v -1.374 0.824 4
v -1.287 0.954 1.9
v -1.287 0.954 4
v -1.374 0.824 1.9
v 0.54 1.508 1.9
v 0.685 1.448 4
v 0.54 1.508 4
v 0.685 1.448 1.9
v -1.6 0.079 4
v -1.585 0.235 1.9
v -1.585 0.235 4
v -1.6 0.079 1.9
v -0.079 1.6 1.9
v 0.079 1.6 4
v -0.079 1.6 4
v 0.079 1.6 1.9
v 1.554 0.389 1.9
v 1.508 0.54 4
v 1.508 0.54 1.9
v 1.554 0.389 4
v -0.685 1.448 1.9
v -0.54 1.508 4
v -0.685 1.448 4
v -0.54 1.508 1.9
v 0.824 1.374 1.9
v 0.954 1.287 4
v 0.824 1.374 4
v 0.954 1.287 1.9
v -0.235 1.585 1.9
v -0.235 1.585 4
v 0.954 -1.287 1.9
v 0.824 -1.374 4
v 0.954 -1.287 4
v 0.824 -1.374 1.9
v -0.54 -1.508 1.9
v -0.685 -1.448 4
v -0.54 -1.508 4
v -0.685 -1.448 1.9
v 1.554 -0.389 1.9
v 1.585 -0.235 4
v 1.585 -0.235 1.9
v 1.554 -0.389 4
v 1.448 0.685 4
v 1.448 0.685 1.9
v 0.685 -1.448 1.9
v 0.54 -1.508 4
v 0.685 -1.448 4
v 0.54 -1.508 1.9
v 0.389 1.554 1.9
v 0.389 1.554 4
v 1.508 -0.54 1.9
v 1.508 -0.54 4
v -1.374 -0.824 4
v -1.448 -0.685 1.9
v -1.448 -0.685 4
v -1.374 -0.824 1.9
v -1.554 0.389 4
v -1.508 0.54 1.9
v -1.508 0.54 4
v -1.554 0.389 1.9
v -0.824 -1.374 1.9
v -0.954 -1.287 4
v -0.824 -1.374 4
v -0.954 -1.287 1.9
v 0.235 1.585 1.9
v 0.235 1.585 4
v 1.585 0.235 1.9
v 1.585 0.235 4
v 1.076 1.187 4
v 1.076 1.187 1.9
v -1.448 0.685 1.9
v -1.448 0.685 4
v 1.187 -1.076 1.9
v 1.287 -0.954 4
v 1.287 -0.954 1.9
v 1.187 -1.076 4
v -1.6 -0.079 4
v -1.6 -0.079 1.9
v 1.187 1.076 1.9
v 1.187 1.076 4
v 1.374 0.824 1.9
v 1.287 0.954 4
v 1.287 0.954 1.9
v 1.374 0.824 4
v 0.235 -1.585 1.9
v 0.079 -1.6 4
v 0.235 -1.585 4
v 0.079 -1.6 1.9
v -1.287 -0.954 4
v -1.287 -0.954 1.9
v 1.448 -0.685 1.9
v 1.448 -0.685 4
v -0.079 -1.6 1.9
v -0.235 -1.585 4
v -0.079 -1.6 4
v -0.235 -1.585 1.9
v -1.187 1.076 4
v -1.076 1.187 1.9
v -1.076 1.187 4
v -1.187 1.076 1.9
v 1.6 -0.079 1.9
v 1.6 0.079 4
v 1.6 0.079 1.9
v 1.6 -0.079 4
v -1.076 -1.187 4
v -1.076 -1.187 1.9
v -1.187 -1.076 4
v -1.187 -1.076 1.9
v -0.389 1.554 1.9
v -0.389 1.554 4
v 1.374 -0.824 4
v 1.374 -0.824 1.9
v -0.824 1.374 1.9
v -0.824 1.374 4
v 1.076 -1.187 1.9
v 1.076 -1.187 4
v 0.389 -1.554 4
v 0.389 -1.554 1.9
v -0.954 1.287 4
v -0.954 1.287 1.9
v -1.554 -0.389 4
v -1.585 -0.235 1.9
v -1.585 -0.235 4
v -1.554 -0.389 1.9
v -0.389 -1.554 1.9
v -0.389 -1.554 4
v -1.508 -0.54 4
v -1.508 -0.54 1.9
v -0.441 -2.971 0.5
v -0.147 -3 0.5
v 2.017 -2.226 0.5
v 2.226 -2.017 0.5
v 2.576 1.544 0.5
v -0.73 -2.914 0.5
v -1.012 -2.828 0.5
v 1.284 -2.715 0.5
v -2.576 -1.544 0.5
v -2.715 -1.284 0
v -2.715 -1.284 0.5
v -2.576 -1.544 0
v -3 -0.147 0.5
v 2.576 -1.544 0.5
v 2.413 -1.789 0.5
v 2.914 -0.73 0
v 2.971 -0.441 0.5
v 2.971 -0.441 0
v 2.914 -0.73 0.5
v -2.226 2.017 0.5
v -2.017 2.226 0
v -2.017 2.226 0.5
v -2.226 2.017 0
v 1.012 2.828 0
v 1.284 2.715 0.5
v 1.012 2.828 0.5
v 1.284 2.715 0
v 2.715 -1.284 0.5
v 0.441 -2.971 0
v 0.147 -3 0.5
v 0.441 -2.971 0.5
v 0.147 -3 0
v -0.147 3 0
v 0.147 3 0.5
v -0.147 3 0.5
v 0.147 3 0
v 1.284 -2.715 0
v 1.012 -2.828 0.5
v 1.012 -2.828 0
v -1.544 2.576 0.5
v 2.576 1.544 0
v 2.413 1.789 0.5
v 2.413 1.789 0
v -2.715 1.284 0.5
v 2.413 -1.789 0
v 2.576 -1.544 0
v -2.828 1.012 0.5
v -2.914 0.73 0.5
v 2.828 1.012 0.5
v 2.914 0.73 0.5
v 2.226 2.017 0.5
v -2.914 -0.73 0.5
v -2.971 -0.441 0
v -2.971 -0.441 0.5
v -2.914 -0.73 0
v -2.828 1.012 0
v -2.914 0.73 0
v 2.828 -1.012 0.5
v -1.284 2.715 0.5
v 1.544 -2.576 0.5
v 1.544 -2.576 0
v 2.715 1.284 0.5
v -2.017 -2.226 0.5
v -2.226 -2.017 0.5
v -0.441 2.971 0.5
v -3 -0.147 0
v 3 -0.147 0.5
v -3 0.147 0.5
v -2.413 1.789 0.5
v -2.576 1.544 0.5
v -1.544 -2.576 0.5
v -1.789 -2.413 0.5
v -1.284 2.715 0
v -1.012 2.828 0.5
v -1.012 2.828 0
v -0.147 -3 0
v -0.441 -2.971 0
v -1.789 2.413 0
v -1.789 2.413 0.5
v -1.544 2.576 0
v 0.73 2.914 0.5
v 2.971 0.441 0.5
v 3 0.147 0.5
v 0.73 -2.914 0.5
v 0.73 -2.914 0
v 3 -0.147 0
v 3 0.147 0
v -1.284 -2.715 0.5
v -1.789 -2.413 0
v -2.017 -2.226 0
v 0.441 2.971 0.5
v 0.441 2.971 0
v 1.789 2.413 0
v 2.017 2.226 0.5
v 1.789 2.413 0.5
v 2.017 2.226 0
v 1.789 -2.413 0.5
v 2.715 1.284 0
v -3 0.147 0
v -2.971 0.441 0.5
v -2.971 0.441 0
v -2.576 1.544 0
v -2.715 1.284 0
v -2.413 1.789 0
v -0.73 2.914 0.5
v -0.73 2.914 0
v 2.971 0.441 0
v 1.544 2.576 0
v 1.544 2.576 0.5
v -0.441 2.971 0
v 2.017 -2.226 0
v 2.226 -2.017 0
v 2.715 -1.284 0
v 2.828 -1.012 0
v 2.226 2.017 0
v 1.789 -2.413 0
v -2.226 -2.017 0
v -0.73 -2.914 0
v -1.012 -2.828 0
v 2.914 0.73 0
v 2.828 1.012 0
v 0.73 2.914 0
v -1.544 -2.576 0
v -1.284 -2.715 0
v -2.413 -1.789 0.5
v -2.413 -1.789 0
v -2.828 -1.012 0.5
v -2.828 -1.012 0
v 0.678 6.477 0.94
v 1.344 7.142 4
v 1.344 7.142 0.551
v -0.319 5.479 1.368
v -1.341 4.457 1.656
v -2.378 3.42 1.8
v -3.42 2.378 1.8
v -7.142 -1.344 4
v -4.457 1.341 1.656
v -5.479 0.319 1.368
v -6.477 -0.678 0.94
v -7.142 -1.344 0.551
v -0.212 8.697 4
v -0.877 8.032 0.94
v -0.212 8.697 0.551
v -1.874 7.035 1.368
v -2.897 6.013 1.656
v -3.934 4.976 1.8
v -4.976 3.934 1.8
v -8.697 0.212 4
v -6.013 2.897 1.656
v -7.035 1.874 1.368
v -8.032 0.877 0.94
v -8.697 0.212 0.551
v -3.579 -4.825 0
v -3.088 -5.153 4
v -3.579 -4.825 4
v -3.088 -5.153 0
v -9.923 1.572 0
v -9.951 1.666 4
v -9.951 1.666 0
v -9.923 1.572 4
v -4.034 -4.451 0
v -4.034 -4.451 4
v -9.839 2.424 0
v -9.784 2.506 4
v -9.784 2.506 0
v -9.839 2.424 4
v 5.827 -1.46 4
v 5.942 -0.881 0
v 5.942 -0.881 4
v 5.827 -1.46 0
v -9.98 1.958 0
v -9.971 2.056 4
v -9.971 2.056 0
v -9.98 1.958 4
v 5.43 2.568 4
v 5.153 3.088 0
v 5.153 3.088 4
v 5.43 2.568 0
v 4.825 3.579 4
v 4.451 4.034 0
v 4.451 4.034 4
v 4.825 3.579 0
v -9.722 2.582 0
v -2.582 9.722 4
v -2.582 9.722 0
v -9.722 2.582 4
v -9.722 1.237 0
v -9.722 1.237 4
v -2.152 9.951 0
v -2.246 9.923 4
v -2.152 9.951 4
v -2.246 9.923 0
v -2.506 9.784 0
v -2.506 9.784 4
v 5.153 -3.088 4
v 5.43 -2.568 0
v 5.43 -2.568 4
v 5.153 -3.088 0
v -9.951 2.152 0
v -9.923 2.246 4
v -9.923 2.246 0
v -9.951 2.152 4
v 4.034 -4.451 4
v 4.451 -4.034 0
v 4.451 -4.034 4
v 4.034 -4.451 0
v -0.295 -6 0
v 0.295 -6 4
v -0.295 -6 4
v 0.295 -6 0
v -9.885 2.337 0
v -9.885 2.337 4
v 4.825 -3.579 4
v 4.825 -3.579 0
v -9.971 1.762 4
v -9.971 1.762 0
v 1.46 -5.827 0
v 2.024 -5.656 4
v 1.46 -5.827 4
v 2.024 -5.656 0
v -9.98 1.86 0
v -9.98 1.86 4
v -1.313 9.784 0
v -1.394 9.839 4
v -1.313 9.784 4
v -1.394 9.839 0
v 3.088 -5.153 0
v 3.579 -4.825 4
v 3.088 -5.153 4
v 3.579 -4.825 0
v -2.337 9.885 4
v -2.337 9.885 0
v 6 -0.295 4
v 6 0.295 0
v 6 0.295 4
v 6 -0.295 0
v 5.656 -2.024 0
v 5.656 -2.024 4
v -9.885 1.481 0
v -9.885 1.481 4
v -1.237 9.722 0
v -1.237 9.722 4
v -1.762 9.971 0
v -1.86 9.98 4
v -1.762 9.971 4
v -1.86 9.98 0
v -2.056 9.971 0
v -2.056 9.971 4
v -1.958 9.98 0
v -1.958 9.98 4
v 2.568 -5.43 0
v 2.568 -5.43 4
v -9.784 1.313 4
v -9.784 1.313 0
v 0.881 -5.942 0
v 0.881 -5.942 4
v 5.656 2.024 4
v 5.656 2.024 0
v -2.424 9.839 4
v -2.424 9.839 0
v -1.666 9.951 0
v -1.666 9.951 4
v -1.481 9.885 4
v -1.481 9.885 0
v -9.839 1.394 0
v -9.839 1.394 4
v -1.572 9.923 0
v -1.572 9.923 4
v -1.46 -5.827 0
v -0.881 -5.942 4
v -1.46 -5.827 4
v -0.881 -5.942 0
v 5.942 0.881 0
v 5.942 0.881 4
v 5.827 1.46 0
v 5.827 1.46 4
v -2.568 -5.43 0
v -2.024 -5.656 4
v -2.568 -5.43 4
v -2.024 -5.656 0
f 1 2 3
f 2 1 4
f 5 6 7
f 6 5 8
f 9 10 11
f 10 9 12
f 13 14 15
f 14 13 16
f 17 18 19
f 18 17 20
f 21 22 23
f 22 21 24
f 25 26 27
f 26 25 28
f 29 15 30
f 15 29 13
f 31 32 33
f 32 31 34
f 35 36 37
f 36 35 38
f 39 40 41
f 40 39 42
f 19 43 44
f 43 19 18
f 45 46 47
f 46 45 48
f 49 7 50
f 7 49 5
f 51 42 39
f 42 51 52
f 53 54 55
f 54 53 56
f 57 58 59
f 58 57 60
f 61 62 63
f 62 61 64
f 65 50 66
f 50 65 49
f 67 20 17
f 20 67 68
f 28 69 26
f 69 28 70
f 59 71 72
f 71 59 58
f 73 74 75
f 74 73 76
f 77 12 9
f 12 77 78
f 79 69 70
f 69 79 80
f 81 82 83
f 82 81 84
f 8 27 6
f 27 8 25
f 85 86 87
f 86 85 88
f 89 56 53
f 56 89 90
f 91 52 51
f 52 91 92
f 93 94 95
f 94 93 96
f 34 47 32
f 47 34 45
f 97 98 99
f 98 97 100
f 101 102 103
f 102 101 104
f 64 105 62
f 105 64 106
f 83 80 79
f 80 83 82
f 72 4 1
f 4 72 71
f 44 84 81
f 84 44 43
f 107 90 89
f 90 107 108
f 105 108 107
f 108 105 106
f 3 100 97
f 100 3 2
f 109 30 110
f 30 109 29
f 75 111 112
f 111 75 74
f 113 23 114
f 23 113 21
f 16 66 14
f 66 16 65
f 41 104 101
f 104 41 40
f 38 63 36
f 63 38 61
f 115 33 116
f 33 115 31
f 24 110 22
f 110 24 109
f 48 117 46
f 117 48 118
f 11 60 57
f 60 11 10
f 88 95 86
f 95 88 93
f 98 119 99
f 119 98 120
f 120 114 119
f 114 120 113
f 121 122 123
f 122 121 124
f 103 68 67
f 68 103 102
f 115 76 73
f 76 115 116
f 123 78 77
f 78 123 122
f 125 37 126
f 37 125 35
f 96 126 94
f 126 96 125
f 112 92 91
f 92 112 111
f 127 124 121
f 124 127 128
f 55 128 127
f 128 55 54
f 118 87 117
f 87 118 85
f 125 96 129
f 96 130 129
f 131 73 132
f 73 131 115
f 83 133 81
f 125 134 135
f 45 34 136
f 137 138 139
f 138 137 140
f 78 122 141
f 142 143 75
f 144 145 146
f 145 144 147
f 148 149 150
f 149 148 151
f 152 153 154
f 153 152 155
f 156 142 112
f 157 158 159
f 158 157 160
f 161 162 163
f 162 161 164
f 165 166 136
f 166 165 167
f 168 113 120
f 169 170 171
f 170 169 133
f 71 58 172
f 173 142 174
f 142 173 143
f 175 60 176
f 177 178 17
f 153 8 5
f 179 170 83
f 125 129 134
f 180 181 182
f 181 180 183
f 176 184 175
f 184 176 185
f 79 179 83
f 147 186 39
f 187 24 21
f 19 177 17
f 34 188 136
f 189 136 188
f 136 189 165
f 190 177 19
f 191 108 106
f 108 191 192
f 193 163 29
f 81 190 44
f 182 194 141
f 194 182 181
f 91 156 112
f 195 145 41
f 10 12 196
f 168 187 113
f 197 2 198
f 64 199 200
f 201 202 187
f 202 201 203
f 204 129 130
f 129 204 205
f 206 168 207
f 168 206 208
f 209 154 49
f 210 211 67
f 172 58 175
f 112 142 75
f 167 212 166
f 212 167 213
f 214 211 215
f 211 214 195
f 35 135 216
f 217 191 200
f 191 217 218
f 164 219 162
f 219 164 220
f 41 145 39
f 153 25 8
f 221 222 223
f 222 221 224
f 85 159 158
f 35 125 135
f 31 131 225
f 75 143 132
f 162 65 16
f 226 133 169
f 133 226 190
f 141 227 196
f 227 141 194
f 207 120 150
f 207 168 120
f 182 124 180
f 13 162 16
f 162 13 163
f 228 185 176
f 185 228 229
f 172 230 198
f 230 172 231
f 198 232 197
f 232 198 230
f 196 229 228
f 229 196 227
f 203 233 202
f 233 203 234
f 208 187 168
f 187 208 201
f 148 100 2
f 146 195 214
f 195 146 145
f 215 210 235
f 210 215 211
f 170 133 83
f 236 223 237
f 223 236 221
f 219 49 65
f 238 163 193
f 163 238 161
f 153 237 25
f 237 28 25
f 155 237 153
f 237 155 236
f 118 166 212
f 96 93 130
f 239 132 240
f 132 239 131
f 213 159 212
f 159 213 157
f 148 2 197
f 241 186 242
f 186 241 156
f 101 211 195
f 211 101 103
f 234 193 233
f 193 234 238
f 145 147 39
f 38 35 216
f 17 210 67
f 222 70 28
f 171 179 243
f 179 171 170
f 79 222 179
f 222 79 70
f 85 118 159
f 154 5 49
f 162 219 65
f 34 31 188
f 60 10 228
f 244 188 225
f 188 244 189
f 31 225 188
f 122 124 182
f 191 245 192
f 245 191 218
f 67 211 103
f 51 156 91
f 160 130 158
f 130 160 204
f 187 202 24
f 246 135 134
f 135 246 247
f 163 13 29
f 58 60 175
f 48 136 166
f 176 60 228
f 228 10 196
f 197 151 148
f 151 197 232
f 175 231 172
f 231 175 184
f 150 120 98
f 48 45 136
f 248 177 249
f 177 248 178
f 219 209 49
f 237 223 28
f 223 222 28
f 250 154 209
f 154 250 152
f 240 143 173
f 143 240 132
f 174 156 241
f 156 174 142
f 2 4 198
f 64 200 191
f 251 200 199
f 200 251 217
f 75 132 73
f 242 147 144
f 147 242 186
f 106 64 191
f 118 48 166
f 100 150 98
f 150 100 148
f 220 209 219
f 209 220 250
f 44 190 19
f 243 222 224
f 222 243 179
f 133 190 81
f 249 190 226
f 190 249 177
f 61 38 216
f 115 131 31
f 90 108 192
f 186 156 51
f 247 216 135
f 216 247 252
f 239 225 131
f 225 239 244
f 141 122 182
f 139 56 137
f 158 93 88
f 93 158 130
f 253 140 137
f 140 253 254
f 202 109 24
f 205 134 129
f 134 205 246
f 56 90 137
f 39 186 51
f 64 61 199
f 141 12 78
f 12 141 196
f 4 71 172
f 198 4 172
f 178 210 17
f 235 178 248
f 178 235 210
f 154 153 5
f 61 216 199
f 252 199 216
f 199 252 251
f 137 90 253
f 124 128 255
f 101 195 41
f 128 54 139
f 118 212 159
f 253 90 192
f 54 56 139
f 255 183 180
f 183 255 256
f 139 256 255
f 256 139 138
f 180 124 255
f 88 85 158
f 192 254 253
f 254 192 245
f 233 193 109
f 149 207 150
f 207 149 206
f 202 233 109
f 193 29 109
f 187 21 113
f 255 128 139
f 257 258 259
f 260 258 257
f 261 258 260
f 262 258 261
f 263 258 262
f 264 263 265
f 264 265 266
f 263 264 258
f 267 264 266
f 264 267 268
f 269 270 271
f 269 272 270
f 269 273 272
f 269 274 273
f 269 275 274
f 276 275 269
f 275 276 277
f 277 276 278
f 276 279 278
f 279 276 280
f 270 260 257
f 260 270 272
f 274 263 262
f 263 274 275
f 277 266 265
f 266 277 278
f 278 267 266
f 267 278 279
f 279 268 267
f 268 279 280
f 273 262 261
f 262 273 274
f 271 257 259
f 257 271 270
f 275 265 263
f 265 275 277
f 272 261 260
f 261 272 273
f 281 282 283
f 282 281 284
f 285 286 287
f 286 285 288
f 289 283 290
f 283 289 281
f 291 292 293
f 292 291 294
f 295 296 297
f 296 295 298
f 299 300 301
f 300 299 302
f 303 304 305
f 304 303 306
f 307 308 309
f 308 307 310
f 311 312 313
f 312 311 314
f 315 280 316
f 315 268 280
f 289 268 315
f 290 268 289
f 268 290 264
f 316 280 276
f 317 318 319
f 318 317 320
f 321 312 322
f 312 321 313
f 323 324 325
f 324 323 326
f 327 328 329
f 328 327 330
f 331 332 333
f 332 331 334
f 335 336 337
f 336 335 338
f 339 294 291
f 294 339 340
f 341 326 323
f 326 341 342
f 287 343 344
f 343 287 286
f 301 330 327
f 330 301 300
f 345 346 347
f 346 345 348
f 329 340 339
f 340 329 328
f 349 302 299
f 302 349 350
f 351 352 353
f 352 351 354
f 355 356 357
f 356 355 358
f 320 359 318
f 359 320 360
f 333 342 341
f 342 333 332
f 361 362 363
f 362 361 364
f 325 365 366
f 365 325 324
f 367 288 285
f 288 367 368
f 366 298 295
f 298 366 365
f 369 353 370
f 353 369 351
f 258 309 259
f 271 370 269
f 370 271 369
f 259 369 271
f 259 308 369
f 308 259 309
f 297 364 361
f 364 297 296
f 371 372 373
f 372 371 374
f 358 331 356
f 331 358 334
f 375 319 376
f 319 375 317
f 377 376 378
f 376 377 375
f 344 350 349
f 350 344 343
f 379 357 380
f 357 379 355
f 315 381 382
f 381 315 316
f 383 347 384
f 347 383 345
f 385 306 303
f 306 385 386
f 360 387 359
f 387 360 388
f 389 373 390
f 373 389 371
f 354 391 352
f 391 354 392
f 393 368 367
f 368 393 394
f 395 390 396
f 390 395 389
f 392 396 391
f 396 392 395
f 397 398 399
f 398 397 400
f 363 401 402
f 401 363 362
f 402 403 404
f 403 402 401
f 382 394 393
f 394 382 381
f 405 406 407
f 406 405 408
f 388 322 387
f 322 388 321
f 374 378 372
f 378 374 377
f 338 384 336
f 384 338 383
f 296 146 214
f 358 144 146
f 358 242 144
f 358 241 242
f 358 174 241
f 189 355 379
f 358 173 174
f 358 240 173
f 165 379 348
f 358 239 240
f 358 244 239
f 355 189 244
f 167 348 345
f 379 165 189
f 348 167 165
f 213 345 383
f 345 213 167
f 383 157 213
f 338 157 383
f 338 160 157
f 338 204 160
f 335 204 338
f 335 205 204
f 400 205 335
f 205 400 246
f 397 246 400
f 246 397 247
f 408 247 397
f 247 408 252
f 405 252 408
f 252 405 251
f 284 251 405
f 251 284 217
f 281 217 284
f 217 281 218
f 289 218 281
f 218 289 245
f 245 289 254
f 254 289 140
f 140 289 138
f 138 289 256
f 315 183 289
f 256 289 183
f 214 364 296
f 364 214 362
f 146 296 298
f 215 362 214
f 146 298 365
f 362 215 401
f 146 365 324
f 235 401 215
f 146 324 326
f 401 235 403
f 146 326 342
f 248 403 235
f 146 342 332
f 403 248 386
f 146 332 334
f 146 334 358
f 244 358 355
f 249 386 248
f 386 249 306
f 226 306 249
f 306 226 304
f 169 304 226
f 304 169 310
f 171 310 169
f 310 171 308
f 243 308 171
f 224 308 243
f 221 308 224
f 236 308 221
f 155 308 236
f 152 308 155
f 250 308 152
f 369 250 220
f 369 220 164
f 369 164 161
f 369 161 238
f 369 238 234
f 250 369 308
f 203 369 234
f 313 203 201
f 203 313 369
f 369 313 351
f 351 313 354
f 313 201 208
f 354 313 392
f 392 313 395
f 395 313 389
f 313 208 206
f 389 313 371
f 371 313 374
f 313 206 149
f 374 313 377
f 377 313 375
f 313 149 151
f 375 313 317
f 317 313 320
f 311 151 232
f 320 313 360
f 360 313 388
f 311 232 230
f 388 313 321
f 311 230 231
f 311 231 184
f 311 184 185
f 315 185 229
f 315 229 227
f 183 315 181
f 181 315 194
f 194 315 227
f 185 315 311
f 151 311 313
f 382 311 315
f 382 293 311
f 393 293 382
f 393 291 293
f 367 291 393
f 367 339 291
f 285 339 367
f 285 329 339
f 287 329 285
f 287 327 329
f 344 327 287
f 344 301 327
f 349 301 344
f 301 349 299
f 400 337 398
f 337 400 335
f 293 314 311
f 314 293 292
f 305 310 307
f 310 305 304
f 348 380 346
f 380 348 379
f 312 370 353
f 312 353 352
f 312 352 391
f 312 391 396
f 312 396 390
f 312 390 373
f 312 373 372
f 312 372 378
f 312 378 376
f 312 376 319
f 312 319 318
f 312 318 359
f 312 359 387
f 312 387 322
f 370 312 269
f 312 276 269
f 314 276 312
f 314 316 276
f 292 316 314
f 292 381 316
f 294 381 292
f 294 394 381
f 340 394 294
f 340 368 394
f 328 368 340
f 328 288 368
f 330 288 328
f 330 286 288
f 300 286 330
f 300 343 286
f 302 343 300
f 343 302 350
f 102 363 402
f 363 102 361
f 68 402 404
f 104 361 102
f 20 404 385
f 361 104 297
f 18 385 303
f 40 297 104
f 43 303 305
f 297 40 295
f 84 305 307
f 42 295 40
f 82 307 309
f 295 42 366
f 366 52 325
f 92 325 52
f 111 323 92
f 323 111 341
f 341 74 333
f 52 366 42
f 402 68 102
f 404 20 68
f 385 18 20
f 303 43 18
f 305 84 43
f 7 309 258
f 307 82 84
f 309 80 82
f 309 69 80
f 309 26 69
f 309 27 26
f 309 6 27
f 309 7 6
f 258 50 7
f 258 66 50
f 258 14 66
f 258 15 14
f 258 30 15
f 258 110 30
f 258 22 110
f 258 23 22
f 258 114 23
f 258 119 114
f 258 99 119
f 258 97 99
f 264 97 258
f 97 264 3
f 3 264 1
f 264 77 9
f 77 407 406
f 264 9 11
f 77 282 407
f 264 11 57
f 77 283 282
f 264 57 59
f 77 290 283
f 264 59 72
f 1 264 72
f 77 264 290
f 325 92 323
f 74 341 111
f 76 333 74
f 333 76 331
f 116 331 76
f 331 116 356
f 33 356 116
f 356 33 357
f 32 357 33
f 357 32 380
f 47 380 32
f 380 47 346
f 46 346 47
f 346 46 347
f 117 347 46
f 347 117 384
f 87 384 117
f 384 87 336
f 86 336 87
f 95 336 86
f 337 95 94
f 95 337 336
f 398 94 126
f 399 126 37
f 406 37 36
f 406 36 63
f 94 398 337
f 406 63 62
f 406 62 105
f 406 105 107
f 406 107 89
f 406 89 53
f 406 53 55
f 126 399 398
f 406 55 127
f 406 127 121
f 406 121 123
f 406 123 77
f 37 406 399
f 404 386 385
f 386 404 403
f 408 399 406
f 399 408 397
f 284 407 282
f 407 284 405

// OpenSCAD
// file: lib/util.scad
resolution = (true) ? 64 : 16; // switch to res of 16 for better preview performance

pi = 3.141592;

left = -1;
right = 1;
top = 1;
bottom = -1;
rear = 1;
front = -1;

function accurate_diam(diam,sides) = 1 / cos(180/sides) / 2 * diam;

module hole(diam,len,sides=8) {
  rotate([0,0,180/sides]) {
    cylinder(r=accurate_diam(diam,sides),h=len,center=true,$fn=sides);
  }
}

module accurate_circle(diam,sides=8) {
  rotate([0,0,180/sides]) {
    circle(r=accurate_diam(diam,sides),$fn=sides);
  }
}

module debug_axes() {
  color("red") translate([50,0,0]) cube([100,.2,.2],center=true);
  color("green") translate([0,50,0]) cube([.2,100,.2],center=true);
  color("blue") translate([0,0,50]) cube([.2,.2,100],center=true);
}

module ring(id,thickness,height,fn=16) {
  od = id + thickness;
  linear_extrude(height=height,center=true) {
    difference() {
      accurate_circle(od,fn);
      accurate_circle(id,fn);
    }
  }
}

module rounded_square(width,depth,diam,fn=resolution) {
  pos_x = width/2-diam/2;
  pos_y = depth/2-diam/2;

  hull() {
    for(x=[left,right]) {
      for(y=[front,rear]) {
        translate([x*pos_x,y*pos_y,0]) {
          accurate_circle(diam,fn);
        }
      }
    }
  }
}

module rounded_cube(width,depth,height,diam,fn=resolution) {
  linear_extrude(height=height,center=true,convexity=3) {
    rounded_square(width,depth,diam,fn);
  }
}

module round_corner_filler(diam,length) {
  linear_extrude(height=length,center=true,convexity=3) {
    round_corner_filler_profile(diam);
  }
}

module round_corner_filler_profile(diam,res=resolution) {
  difference() {
    translate([diam/4,diam/4,0]) {
      square([diam/2,diam/2],center=true);
    }
    translate([diam/2,diam/2,0]) {
      accurate_circle(diam,res);
    }
  }
}

module space_along_length(length,min_hole_spacing=4*inch,from_end=1*inch) {
  avail_length = length - (from_end*2);
  num_spaces   = floor(avail_length / min_hole_spacing);
  extra_space  = (avail_length - (num_spaces*min_hole_spacing)) / num_spaces;
  spacing      = min_hole_spacing + extra_space;

  // echo(length, num_spaces, spacing);

  translate([0,-length/2+from_end,0]) {
    for(y=[0:num_spaces]) {
      translate([0,y*spacing,0]) {
        children();
      }
    }
  }
}

module letter_spike(thin_width,thick_width,thickness) {
  hull() {
    cylinder(r=thin_width,h=thickness*2,center=true,$fn=16);
    cylinder(r=thick_width,h=0.01,center=true,$fn=16);
  }
}

module letter_L(width=10,height=20,thickness=0.5,thick_width=2,thin_width=0.3) {
  lines = [
    [
      [-width/2,height/2,0],
      [-width/2,-height/2,0],
    ],
    [
      [-width/2,-height/2,0],
      [width/2,-height/2,0],
    ],
  ];

  for(pair=lines) {
    hull() {
      for(vect=pair) {
        translate(vect) {
          letter_spike(thin_width,thick_width,thickness);
        }
      }
    }
  }
}

module letter_R(width=10,height=20,thickness=0.5,thick_width=2,thin_width=0.3) {
  lines = [
    [
      [-width/2,height/2,0],
      [-width/2,-height/2,0],
    ],
    [
      [-width/2,height/2,0],
      [width/2,height/3,0],
    ],
    [
      [width/2,height/3,0],
      [-width/4,0,0],
    ],
    [
      [-width/2,0,0],
      [-width/4,0,0],
    ],
    [
      [-width/4,0,0],
      [width/2,-height/2,0],
    ],
  ];

  for(pair=lines) {
    hull() {
      for(vect=pair) {
        translate(vect) {
          letter_spike(thin_width,thick_width,thickness);
        }
      }
    }
  }
}

module zip_tie_cavity(inner_diam_input,zip_tie_thickness,zip_tie_width,fn=resolution) {
  inner_diam = inner_diam_input -0.05;
  overall_width = inner_diam+zip_tie_thickness*2;

  module profile() {
    for(x=[left,right]) {
      translate([x*(inner_diam/2+zip_tie_thickness/2),overall_width,0]) {
        square([zip_tie_thickness,overall_width*2],center=true);
      }
    }

    intersection() {
      translate([0,-overall_width,0]) {
        square([overall_width*2,overall_width*2],center=true);
      }
      difference() {
        accurate_circle(inner_diam+zip_tie_thickness*2,fn);
        accurate_circle(inner_diam,fn);
      }
    }
  }

  linear_extrude(height=zip_tie_width,convexity=3,center=true) {
    profile();
  }
}

module printed_extrusion_carriage_profile(body_width,body_height) {
  spring_thickness = extrude_width*4;
  spring_gap_width = 1;
  preload = -0.2; // negative makes more slack both for print and UHMWPE tape
  wall_thickness = extrude_width*4;

  cavity_width = body_width - wall_thickness*4;
  cavity_height = body_height - wall_thickness*4;

  module spring_profile() {
    contact_width = 8;

    translate([0,-preload+spring_thickness/2]) {
      translate([left*(y_rail_extrusion_width/2-contact_width/2),0,0]) {
        rounded_square(contact_width,spring_thickness,spring_thickness);
      }
      hull() {
        translate([left*(y_rail_extrusion_width/2-contact_width+spring_thickness/2),0,0]) {
          accurate_circle(spring_thickness,resolution);
        }
        translate([right*(y_rail_extrusion_width/2-spring_thickness),spring_gap_width/2,0]) {
          accurate_circle(spring_thickness,resolution);
        }
      }
      translate([right*(y_rail_extrusion_width/2-spring_thickness),2-spring_thickness/2+spring_gap_width/2,0]) {
        rounded_square(spring_thickness,4,spring_thickness);
      }
    }
  }

  for(z=[top,bottom]) {
    mirror([0,1-z,0]) {
      translate([0,y_rail_extrusion_height/2]) {
        spring_profile();
      }

      for(x=[left,right]) {
        mirror([1-x,0,0]) {
          translate([y_rail_extrusion_width/2,y_rail_extrusion_height/4,0]) {
            rotate([0,0,-90]) {
              spring_profile();
            }
          }
        }
      }
    }
  }

  difference() {
    gap_width = cavity_height - y_rail_extrusion_height;
    rounded_square(body_width,body_height,wall_thickness*8);
    rounded_square(cavity_width,cavity_height,gap_width);
  }
}

/*
translate([-10,0,0]) {
  letter_L();
}

translate([10,0,0]) {
  letter_R();
}
*/
// file: config.scad
include <./lib/util.scad>;
include <./lib/vitamins.scad>;

tolerance = 0.2;
extrude_width = 0.4;
wall_thickness = extrude_width*3;

countersink_all_the_things = 1;

room_below_extrusion_for_electronics = 34;

extrusion_mount_screw_diam = m5_diam;
extrusion_mount_screw_head_diam = (countersink_all_the_things) ? m5_fsc_head_diam : m5_nut_diam;

m3_thread_into_hole_diam = 2.9;
m3_loose_diam = m3_diam + tolerance;

m5_thread_into_hole_diam = 4.9;
m5_loose_diam = 5+tolerance;

extrusion_width = 20;

leadscrew_diam = 5;
leadscrew_hole_diam = 6.5;
leadscrew_nut_shaft_diam = 8.5;
leadscrew_nut_shaft_length = 6.5;
leadscrew_nut_hole_dist = 6.611;
leadscrew_nut_flange_diam = 20;
leadscrew_nut_flange_thickness = 3.25;
leadscrew_nut_mounting_hole_dist = 6.35;
leadscrew_nut_mounting_hole_diam = 2.8; // from walter's -- threading m3 into plastic?
leadscrew_motor_length = 33.5;
x_motor_length = 44;
y_motor_length = 44;

rounded_diam = m3_nut_diam + tolerance*2 + wall_thickness*4;

t_slot_nut_screw_hole_depth = 5;
t_slot_nut_length = 11;

y_idler_in_endcap = true;

// FIXME: adjust these to fit an aluminum heatspreader between the aluminum extrusion and the duet wifi board to provide a passive heatsink for the drivers -- An idea I got from Walter.
duet_mount_thickness = 3;
duet_mount_bevel_height = 1;

end_cap_rounded_diam = 3+wall_thickness*4;
end_cap_pos_x = 40;
end_cap_extrusion_width_to_cover = 100;
end_cap_thickness = (y_idler_in_endcap) ? m5_thread_into_hole_diam + 2*(1.2*2)-0.2 : 5; // remove a 0.2mm layer because cura was printing an infill layer rather than solid
end_cap_offset_x = -4;
end_cap_overhang = end_cap_rounded_diam/2;
end_cap_width = end_cap_extrusion_width_to_cover + abs(end_cap_offset_x)*2 + end_cap_overhang*2;
end_cap_height = extrusion_width+room_below_extrusion_for_electronics+wall_thickness;

y_extrusion_width = (true) ? 100 : 80;

y_idler_pos_x = -10+y_extrusion_width-30;
y_idler_dist_y_from_extrusion = (y_idler_in_endcap) ? -end_cap_thickness/2 : gt2_toothed_idler_id;
y_idler_dist_z_from_extrusion = 1;

extra_clearance_for_leveling_screws_and_y_idlers = 3;

heated_bed_hole_spacing = 92;
// using what walter is doing, as I don't understand whosawhatsis' version, but he's using something like -24
// I like the idea of a less-cantilevered platform.
y_carriage_pos_x = -10+85;
y_rail_pos_x = -10+y_extrusion_width-10;
y_belt_clamp_hole_dist_from_mgn = 7;

bed_carriage_offset = y_carriage_pos_x-y_rail_pos_x;
build_plate_len = 130;

//leadscrew_pos_y = -leadscrew_nut_flange_diam/2-1;
//leadscrew_pos_y = -11; // we could move it closer with a printed bracket, but it would interfere with the X idler without redefining the X idler Y pos
leadscrew_pos_y = -13; // what walter is using

z_nut_base_height = mgn12c_length/2 - mgn12c_hole_spacing_length/2 + m3_socket_head_diam/2 + extrude_width*2;

gt2_toothed_idler_id_hole = gt2_toothed_idler_id-0.15; // thread the idler pulley shaft into plastic

leadscrew_nut_mounting_hole_depth = z_nut_base_height - leadscrew_nut_flange_thickness - extrude_width*2;

leadscrew_nut_shoulder_below_carriage_holes = 4.5;

x_idler_bevel_height = 1;
idler_shoulder_above_rail = 9/2+5.75;

z_nut_mount_depth = abs(leadscrew_pos_y)+7; // copying from walter
echo("z_nut_mount_depth: ", z_nut_mount_depth);
z_nut_mount_height = idler_shoulder_above_rail - x_idler_bevel_height + mgn12c_hole_spacing_length/2 + mgn12c_length/2;

echo("z_nut_mount_height: ", z_nut_mount_height);
z_nut_body_pos_z = mgn12c_hole_spacing_length/2+idler_shoulder_above_rail-x_idler_bevel_height-z_nut_mount_height/2;

// x_idler_on_z_pos_x = -11; // walter
x_idler_on_z_pos_x = left*(leadscrew_diam/2+gt2_toothed_idler_flange_od/2+1);
x_idler_on_z_pos_y = leadscrew_pos_y-3;
x_idler_on_z_pos_z = z_nut_body_pos_z + z_nut_mount_height/2 + x_idler_bevel_height;

meat_on_far_side_of_idler = gt2_toothed_idler_id_hole/2 + wall_thickness*3;
leadscrew_clearance = 1;
idler_shaft_body_width = meat_on_far_side_of_idler + abs(x_idler_on_z_pos_x) - leadscrew_hole_diam/2 - leadscrew_clearance;
z_nut_mount_width = meat_on_far_side_of_idler + abs(x_idler_on_z_pos_x) + mgn12c_hole_spacing_width/2 + m3_socket_head_diam/2 + extrude_width*2;
z_nut_body_pos_x = x_idler_on_z_pos_x-meat_on_far_side_of_idler+z_nut_mount_width/2;

mgn9_rail_width_allowance = mgn9_rail_width+tolerance;
mgn9_rail_height_allowance = mgn9_rail_height+tolerance;
// main file
include <./config.scad>;
include <./lib/util.scad>;
include <./lib/vitamins.scad>;

nut_depth = 5.25;
nut_width = 11;
neck_width = 6;
neck_depth = 1.75;
bevel_face_width = 5;
bevel_tip_thickness = 0.5;

module tnut_body(length=10) {
  module profile() {
    translate([0,neck_depth/2,0]) {
      square([neck_width,neck_depth],center=true);
    }

    hull() {
      translate([0,nut_depth-1,0]) {
        square([bevel_face_width,2],center=true);
      }
      translate([0,neck_depth+bevel_tip_thickness/2,0]) {
        square([nut_width,bevel_tip_thickness],center=true);
      }
    }
  }

  linear_extrude(height=length,center=true,convexity=3) {
    profile();
  }
}

module tnut_m2(hole_offset=0) {
  module body() {
    tnut_body();
  }

  module holes() {
    rotate([90,0,0]) {
      hole(1.9,nut_depth+1,resolution);
      translate([0,0,-nut_depth]) {
        hole(m2_threaded_insert_diam,m2_threaded_insert_height*2,resolution);
      }
    }
  }

  difference() {
    body();
    holes();
  }
}

module tnut_zip_tie_anchor() {
  thickness = 4;
  body_diam = 12;
  zip_tie_hole_width = 2 + tolerance;
  zip_tie_hole_height = 2 + tolerance;
  zip_tie_hole_diam = body_diam*2.5;
  zip_tie_pos_y = m3_diam/2 + wall_thickness*2 + tolerance + zip_tie_hole_width/2;

  zip_tie_dongle_length = wall_thickness*4 + zip_tie_hole_width;

  module body() {
    translate([0,0,thickness/2]) {
      linear_extrude(height=thickness,center=true,convexity=3) {
        hull() {
          translate([0,0,thickness/2]) {
            accurate_circle(body_diam,resolution);

            translate([0,zip_tie_pos_y,0]) {
              rounded_square(body_diam,zip_tie_dongle_length,2);
            }
          }
        }
      }
      translate([0,zip_tie_pos_y,thickness/2-zip_tie_hole_height/2]) {
        % cube([20,zip_tie_hole_width,zip_tie_hole_height],center=true);
      }
    }
  }

  module holes() {
    m3_countersink_screw(thickness+1);

    translate([0,zip_tie_pos_y,thickness-zip_tie_hole_height]) {
      // cube([body_diam+2,zip_tie_hole_width,zip_tie_hole_height],center=true);

      translate([0,0,-zip_tie_hole_diam/2]) {
        rotate([90,0,0]) {
          difference() {
            hole(zip_tie_hole_diam+10,zip_tie_hole_width,resolution);
            hole(zip_tie_hole_diam,zip_tie_hole_width+1,resolution);
          }
        }
      }
    }
  }

  difference() {
    body();
    holes();
  }
}

module tnut_cable_anchor(cable_diam) {
  thickness = cable_diam + 1;
  body_diam = 15;
  anchor_pos_y = m3_diam/2 + extrude_width*4 + tolerance + cable_diam/2;

  anchor_length = 2*(extrude_width*4) + cable_diam;

  module body() {
    translate([0,0,thickness/2]) {
      linear_extrude(height=thickness,center=true,convexity=3) {
        hull() {
          translate([0,0,thickness/2]) {
            accurate_circle(body_diam,resolution);

            translate([0,anchor_pos_y,0]) {
              rounded_square(body_diam,anchor_length,2);
            }
          }
        }
      }
    }
  }

  module holes() {
    m3_countersink_screw(thickness+1);

    translate([0,anchor_pos_y,thickness-cable_diam/2]) {
      rotate([0,-90,0]) {
        linear_extrude(height=body_diam+2,center=true,convexity=3) {
          hull() {
            accurate_circle(cable_diam,resolution);
            translate([cable_diam/2,0,0]) {
              square([cable_diam,cable_diam],center=true);
            }
          }
        }
      }
    }
  }

  difference() {
    body();
    holes();
  }
}

rotate([0,0,45]) {
  // tnut_cable_anchor(4);
  tnut_zip_tie_anchor();
}
translate([0,0,-1]) {
  % cube([20,20,2],center=true);
}
